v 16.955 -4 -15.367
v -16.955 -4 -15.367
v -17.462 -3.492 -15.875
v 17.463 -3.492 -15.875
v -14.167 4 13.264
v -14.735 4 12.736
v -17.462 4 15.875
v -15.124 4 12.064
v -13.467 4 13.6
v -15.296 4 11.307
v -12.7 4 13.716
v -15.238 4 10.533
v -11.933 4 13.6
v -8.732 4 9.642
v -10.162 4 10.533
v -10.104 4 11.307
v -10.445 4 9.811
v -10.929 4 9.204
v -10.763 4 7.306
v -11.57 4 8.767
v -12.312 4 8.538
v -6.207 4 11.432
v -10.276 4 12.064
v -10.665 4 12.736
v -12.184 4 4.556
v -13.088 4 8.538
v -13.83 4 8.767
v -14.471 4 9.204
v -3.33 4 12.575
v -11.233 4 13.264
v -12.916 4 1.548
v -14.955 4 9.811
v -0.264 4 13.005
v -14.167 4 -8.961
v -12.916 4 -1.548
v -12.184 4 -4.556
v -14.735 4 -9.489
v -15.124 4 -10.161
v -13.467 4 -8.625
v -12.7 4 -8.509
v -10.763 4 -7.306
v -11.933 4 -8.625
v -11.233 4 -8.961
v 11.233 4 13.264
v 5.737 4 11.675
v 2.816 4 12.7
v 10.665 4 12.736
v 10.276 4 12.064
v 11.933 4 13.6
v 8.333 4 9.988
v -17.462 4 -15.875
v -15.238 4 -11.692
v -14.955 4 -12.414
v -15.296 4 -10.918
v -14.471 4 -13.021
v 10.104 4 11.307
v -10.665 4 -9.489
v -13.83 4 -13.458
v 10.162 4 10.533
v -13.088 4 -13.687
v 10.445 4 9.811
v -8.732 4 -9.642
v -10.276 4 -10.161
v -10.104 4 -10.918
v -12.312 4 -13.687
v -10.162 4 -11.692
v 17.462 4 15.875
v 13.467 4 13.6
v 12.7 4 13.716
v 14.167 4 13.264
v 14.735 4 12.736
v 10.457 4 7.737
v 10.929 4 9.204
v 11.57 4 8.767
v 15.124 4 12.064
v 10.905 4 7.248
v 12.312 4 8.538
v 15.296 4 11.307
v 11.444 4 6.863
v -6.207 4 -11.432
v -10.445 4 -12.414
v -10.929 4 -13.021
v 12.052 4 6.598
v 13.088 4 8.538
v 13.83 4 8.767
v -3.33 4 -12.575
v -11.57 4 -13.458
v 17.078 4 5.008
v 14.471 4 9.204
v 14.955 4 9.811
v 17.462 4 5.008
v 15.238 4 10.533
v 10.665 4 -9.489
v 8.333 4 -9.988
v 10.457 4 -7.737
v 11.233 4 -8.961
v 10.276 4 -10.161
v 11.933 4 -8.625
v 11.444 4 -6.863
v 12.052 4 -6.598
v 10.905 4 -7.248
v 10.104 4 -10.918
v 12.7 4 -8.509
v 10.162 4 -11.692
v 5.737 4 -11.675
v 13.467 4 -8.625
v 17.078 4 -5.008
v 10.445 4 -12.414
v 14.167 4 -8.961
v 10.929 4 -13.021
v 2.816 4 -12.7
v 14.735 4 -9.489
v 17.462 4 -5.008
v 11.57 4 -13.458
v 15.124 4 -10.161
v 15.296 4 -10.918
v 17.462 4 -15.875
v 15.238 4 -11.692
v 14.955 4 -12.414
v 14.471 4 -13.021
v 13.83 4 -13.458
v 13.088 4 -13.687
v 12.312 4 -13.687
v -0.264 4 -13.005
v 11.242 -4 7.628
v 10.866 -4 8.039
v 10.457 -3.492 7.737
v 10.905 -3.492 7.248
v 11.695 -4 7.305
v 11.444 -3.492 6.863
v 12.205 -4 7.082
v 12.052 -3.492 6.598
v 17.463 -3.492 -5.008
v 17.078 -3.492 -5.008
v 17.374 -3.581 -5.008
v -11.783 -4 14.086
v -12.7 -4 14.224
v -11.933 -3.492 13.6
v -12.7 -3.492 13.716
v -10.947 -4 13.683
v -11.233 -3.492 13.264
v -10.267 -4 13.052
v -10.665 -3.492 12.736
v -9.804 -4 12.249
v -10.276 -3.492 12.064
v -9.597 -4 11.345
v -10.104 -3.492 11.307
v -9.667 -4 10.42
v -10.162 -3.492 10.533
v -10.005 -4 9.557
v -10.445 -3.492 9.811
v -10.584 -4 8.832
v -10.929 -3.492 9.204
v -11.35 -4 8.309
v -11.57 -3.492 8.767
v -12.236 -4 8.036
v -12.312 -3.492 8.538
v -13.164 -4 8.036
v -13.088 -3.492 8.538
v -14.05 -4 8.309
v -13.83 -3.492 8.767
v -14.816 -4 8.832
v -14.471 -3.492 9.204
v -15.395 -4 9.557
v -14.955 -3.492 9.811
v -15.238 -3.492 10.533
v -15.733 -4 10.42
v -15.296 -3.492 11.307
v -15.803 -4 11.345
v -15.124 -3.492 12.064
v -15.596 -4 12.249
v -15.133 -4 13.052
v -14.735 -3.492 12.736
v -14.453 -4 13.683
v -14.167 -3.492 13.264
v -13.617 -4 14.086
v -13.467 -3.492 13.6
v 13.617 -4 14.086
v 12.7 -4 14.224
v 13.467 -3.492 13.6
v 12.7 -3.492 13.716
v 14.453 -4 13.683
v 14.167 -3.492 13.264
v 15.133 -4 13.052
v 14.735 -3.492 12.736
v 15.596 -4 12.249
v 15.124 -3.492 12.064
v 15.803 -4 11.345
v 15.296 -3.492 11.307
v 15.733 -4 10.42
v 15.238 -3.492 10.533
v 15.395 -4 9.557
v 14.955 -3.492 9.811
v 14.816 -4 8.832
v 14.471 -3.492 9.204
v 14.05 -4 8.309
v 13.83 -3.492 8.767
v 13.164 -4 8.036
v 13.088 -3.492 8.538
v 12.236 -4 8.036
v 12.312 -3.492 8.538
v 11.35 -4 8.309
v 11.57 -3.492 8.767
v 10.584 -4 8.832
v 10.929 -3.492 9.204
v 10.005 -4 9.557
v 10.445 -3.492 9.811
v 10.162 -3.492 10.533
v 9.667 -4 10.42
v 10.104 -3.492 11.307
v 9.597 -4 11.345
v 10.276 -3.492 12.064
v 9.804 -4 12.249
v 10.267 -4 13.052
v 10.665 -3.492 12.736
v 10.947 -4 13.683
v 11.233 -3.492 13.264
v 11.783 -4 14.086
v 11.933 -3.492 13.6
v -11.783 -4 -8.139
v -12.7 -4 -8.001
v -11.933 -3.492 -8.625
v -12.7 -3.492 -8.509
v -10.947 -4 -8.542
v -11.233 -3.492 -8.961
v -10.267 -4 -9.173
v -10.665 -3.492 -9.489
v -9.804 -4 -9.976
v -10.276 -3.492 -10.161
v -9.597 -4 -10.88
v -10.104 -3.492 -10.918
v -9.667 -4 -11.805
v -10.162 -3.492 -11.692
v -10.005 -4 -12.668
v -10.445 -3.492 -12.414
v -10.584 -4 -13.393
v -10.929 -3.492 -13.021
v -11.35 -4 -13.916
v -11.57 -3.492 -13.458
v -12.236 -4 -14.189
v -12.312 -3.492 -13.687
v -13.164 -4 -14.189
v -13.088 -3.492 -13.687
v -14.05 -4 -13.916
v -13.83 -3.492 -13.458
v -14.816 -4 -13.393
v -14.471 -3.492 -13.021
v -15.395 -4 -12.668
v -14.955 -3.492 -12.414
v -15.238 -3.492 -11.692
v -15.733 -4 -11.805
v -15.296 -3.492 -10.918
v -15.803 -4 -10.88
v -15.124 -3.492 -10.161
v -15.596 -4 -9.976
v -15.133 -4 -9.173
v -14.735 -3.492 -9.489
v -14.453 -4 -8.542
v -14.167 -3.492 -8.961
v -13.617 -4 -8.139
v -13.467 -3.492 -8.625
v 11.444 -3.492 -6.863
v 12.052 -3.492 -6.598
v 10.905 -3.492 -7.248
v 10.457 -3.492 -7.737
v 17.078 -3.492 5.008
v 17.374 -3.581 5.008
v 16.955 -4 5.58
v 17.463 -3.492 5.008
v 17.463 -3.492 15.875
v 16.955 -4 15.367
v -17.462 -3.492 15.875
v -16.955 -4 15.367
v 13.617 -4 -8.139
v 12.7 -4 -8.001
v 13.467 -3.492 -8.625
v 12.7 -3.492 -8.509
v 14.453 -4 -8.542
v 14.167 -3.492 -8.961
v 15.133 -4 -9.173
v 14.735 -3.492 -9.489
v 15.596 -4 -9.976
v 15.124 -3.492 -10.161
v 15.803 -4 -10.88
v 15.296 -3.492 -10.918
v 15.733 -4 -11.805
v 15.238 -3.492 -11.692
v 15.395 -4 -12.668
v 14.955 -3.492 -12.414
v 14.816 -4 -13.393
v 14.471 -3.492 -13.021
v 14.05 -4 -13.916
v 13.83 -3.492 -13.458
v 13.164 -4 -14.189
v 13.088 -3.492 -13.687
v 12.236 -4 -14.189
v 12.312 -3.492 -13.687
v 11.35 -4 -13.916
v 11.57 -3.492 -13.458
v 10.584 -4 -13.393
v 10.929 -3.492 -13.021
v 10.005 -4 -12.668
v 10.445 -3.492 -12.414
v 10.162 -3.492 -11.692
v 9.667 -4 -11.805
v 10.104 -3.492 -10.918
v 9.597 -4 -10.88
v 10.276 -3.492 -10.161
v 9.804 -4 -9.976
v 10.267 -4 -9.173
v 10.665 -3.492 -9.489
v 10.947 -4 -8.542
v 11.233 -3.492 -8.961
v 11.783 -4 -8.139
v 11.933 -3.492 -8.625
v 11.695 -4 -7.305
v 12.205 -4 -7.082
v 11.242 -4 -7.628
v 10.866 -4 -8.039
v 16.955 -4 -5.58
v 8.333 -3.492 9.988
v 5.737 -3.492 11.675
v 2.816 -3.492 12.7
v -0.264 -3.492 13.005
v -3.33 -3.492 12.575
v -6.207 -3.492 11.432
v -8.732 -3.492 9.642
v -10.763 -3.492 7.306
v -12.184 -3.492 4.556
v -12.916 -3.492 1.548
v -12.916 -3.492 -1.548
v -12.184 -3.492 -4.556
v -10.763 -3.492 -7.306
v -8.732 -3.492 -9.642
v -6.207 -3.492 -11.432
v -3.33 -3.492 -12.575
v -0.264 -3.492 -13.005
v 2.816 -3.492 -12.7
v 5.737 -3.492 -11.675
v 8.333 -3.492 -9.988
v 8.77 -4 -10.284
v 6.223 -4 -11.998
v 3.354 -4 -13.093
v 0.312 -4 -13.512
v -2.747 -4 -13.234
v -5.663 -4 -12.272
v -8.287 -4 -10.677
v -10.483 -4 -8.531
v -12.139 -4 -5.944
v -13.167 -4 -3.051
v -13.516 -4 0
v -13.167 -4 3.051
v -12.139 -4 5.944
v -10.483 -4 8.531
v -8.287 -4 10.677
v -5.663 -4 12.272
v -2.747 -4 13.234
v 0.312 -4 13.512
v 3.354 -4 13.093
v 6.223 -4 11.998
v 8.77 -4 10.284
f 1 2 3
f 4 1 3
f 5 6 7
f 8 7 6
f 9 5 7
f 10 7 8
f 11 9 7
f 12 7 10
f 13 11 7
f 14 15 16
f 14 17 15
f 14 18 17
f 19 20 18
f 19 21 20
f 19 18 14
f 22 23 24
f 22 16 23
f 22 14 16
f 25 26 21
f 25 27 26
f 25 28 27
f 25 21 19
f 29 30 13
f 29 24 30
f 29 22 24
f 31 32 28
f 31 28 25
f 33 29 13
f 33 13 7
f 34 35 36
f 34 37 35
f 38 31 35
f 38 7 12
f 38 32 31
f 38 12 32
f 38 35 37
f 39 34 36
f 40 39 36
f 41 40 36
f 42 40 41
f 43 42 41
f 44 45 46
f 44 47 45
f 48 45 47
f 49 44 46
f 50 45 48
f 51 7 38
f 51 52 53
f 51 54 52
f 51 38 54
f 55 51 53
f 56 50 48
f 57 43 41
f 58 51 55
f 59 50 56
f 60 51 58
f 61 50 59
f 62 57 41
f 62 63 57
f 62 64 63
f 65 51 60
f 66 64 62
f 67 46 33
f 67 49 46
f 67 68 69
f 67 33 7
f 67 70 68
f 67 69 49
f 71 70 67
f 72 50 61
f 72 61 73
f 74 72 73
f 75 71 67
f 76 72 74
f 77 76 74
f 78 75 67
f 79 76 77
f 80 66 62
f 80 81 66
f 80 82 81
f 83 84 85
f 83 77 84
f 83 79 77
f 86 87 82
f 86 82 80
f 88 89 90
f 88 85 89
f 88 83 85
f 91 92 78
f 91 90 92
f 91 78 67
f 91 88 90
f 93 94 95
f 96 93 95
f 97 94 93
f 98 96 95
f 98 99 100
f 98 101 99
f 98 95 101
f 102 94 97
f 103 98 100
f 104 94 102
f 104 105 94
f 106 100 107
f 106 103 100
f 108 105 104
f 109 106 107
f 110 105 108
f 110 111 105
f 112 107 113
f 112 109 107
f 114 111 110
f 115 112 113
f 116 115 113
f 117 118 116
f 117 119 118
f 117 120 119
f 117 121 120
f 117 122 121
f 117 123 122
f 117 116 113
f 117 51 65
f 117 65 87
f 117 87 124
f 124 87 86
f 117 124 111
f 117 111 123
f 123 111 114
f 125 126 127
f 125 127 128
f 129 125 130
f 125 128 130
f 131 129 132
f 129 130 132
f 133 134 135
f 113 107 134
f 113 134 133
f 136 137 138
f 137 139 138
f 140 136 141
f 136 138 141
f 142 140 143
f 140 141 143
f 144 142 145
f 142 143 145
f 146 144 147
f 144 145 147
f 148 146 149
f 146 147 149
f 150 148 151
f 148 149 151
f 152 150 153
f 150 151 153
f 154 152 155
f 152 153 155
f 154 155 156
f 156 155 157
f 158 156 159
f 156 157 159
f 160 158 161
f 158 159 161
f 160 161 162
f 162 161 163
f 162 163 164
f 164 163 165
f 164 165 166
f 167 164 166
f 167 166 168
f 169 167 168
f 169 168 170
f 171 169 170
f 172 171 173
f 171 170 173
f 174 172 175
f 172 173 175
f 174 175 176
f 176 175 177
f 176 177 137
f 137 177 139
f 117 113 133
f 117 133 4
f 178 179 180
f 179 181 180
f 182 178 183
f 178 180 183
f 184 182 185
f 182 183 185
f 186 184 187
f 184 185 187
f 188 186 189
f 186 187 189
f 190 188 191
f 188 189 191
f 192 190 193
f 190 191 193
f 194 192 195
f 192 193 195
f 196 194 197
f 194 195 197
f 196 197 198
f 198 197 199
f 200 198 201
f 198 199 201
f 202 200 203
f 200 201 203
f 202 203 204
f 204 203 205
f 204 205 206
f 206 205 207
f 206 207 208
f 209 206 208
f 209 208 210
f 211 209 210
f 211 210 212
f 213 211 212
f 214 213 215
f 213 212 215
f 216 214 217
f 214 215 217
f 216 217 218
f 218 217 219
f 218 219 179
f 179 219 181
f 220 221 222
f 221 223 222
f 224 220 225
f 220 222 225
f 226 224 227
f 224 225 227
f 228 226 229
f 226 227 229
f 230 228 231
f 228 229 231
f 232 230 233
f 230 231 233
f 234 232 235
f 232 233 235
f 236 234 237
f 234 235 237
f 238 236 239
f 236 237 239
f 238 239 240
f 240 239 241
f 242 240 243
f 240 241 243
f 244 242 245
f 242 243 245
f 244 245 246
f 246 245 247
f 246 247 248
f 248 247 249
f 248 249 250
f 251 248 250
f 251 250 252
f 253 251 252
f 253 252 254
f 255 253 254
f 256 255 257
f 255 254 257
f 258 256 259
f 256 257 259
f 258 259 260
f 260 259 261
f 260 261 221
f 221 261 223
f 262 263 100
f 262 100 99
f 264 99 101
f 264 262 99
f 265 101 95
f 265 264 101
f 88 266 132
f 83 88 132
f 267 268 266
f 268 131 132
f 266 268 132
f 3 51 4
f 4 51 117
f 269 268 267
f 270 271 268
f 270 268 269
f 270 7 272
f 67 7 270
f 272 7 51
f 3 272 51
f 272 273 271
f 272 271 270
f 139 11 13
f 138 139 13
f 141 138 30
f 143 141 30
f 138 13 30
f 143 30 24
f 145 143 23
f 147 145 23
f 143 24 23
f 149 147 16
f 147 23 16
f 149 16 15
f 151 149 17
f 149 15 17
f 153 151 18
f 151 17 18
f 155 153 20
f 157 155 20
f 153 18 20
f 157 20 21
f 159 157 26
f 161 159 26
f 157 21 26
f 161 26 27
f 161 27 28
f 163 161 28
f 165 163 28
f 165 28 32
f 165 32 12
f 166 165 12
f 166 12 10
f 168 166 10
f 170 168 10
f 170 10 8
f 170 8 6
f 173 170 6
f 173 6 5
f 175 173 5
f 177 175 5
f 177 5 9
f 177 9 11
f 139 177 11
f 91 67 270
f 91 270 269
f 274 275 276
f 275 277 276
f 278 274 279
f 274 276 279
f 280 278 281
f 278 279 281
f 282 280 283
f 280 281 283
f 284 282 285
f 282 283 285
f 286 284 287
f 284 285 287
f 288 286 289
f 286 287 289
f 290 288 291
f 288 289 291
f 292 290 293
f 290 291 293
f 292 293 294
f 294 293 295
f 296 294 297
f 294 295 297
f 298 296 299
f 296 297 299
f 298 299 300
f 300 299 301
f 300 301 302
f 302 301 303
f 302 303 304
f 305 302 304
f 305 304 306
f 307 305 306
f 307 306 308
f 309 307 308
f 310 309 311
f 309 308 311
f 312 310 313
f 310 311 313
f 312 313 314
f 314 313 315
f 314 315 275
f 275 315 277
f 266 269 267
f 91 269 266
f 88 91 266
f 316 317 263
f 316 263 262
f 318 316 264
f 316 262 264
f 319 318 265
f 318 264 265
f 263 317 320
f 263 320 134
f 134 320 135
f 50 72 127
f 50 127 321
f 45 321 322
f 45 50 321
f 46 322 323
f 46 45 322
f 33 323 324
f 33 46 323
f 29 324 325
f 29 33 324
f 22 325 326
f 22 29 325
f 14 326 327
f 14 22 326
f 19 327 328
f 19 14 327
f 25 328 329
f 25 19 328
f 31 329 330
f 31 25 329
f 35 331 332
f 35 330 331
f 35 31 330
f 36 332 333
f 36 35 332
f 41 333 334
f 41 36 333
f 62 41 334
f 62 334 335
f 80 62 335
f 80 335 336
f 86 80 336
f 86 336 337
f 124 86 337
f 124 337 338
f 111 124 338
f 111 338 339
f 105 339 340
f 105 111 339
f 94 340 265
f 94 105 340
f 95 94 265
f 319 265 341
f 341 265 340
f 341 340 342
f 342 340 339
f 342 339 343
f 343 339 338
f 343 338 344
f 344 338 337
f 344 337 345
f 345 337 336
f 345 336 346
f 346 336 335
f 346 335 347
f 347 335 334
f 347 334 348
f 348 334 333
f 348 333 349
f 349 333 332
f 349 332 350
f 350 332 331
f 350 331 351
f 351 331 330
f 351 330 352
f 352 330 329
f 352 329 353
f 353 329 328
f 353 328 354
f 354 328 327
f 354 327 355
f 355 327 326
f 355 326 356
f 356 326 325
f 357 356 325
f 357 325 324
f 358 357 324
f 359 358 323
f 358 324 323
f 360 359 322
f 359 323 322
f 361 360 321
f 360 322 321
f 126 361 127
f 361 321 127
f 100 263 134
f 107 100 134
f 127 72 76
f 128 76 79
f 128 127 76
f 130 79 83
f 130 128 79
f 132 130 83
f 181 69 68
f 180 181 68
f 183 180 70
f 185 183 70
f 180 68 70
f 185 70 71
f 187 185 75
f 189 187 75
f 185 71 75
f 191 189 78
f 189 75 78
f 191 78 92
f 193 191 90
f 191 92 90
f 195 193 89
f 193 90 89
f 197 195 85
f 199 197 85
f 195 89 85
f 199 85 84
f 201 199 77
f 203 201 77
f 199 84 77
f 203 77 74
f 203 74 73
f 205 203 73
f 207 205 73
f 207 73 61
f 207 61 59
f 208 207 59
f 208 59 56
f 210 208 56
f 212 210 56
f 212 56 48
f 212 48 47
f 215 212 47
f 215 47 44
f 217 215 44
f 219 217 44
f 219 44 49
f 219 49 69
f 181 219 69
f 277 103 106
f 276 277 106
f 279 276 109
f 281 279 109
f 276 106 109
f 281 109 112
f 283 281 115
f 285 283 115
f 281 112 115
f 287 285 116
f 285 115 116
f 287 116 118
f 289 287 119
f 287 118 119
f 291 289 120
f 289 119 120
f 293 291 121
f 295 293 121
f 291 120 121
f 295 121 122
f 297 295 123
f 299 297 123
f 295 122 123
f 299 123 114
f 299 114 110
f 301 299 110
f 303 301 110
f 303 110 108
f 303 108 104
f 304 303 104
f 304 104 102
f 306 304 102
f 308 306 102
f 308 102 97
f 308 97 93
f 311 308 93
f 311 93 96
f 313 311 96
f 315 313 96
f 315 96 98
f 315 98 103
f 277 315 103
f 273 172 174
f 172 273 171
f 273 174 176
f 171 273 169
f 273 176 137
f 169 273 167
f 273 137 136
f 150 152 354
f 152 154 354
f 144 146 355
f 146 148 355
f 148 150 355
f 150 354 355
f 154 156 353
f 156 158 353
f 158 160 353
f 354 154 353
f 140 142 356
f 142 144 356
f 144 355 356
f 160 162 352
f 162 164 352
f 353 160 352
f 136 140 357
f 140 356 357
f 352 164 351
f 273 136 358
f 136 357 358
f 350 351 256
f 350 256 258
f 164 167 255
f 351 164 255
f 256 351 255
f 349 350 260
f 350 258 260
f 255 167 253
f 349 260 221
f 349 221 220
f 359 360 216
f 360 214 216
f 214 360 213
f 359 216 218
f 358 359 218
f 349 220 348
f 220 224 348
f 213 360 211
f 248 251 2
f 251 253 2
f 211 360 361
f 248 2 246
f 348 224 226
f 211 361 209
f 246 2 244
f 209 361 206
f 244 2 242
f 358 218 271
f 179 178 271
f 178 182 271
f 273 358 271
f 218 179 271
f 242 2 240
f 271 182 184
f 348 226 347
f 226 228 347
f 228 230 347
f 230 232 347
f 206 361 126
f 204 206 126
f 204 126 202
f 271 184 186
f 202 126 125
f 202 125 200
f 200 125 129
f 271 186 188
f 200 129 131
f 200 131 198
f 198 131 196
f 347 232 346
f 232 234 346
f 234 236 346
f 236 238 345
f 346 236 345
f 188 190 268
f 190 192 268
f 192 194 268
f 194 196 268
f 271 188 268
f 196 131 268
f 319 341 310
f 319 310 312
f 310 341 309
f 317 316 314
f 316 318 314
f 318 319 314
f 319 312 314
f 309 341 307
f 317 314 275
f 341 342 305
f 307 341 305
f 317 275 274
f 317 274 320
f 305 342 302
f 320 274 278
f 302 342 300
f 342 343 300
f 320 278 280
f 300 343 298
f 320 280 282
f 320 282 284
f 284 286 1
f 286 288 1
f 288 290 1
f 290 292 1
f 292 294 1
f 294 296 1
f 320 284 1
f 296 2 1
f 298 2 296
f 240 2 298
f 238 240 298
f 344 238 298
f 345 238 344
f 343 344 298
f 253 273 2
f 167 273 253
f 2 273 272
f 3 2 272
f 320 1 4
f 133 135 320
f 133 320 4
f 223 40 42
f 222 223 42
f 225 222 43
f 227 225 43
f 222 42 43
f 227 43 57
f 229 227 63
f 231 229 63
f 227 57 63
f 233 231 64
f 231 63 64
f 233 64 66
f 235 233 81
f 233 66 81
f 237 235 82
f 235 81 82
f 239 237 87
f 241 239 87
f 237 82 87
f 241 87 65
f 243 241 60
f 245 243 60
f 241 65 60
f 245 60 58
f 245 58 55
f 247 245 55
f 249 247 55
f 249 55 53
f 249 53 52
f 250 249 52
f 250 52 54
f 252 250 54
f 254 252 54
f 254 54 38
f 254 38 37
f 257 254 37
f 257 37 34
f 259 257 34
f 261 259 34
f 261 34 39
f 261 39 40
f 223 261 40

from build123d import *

# Parameters (mm, degrees)
SKETCH1_W              = 34.925
SKETCH1_H              = 31.75
PLATE_DEPTH            = 4
F_10_CLEARANCE_HOLE1_D = 5.1054
LOAD_CELL_CUTOUT_REACH = 26.919
FILLET1_R              = 3.175
CUT_EXTRUDE1_REACH     = 26.919
SKETCH5_R              = 2.6035
CHAMFER1_SIZE          = 0.508


with BuildPart() as part:
    # Sketch1 → Plate (new, symmetric)
    with BuildSketch(Plane(origin=(0, 0, 0), x_dir=(1, 0, 0), z_dir=(0, 1, 0))):
        Rectangle(SKETCH1_W, SKETCH1_H)
    extrude(amount=PLATE_DEPTH, both=True)

    # #10 Clearance Hole1 (through all)
    with Locations(Plane(origin=(0, 4, 0), x_dir=(1, 0, 0), z_dir=(0, 1, 0))):
        with Locations((-12.7, 11.1125), (12.7, 11.1125), (12.7, -11.1125), (-12.7, -11.1125)):
            Hole(F_10_CLEARANCE_HOLE1_D / 2)

    # Sketch4 → Load Cell Cutout (cut, up to next)
    with BuildSketch(Plane(origin=(0, 4, 0), x_dir=(1, 0, 0), z_dir=(0, 1, 0)), mode=Mode.PRIVATE) as load_cell_cutout_sk1:
        with BuildLine():
            Line((11.009869163, 6.927542495), (17.078427656, 5.008))
            Line((17.078427656, 5.008), (22.733, 5.008))
            Line((22.733, 5.008), (22.733, -5.008))
            Line((22.733, -5.008), (17.078427656, -5.008))
            Line((17.078427656, -5.008), (11.009869163, -6.927542495))
            ThreePointArc((11.009869163, -6.927542495), (-13.008, 0), (11.009869163, 6.927542495))
        make_face()
    load_cell_cutout_tool1 = extrude(load_cell_cutout_sk1.sketch, amount=-LOAD_CELL_CUTOUT_REACH, mode=Mode.PRIVATE) & part.part
    add(load_cell_cutout_tool1.solids().sort_by_distance((2.977457, 4, 0))[0], mode=Mode.SUBTRACT)

    # Fillet1
    fillet1_edges = [part.edges().sort_by_distance(p)[0] for p in [
        (11.009869163, 0, 6.927542495),
        (11.009869163, 0, -6.927542495),
    ]]
    fillet(fillet1_edges, radius=FILLET1_R)

    # Sketch5 → Cut-Extrude1 (cut, up to next)
    with BuildSketch(Plane(origin=(0, 4, 0), x_dir=(1, 0, 0), z_dir=(0, 1, 0)), mode=Mode.PRIVATE) as cut_extrude1_sk1:
        with Locations(Location((-12.7, 11.1125, 0), (0, 0, 270))):
            Circle(SKETCH5_R)
    cut_extrude1_tool1 = extrude(cut_extrude1_sk1.sketch, amount=-CUT_EXTRUDE1_REACH, mode=Mode.PRIVATE) & part.part
    # Sketch5 → Cut-Extrude1 (cut, up to next)
    with BuildSketch(Plane(origin=(0, 4, 0), x_dir=(1, 0, 0), z_dir=(0, 1, 0)), mode=Mode.PRIVATE) as cut_extrude1_sk2:
        with Locations(Location((12.7, 11.1125, 0), (0, 0, 270))):
            Circle(SKETCH5_R)
    cut_extrude1_tool2 = extrude(cut_extrude1_sk2.sketch, amount=-CUT_EXTRUDE1_REACH, mode=Mode.PRIVATE) & part.part
    # Sketch5 → Cut-Extrude1 (cut, up to next)
    with BuildSketch(Plane(origin=(0, 4, 0), x_dir=(1, 0, 0), z_dir=(0, 1, 0)), mode=Mode.PRIVATE) as cut_extrude1_sk3:
        with Locations(Location((-12.7, -11.1125, 0), (0, 0, 270))):
            Circle(SKETCH5_R)
    cut_extrude1_tool3 = extrude(cut_extrude1_sk3.sketch, amount=-CUT_EXTRUDE1_REACH, mode=Mode.PRIVATE) & part.part
    # Sketch5 → Cut-Extrude1 (cut, up to next)
    with BuildSketch(Plane(origin=(0, 4, 0), x_dir=(1, 0, 0), z_dir=(0, 1, 0)), mode=Mode.PRIVATE) as cut_extrude1_sk4:
        with Locations(Location((12.7, -11.1125, 0), (0, 0, 270))):
            Circle(SKETCH5_R)
    cut_extrude1_tool4 = extrude(cut_extrude1_sk4.sketch, amount=-CUT_EXTRUDE1_REACH, mode=Mode.PRIVATE) & part.part
    add(cut_extrude1_tool1.solids().sort_by_distance((-12.7, 4, -11.1125))[0], mode=Mode.SUBTRACT)
    add(cut_extrude1_tool2.solids().sort_by_distance((12.7, 4, -11.1125))[0], mode=Mode.SUBTRACT)
    add(cut_extrude1_tool3.solids().sort_by_distance((-12.7, 4, 11.1125))[0], mode=Mode.SUBTRACT)
    add(cut_extrude1_tool4.solids().sort_by_distance((12.7, 4, 11.1125))[0], mode=Mode.SUBTRACT)

    # Chamfer1
    # the kernel refuses this chamfer: 0.508 mm, written as the material it takes off along each edge
    with BuildSketch(Plane(origin=(13.009505309, -4, -9.625084967), x_dir=(-0.30158215810749167, 0, 0.9534401931485937), z_dir=(0.9534401931485937, 0, 0.30158215810749167))) as chamfer1_piece_1:
        Polygon((3.175 - CHAMFER1_SIZE, 0), (3.175, -CHAMFER1_SIZE), (3.175, 0), align=None)
    revolve(axis=Axis((13.009505309, -4, -9.625084967), (0, -1, 0)), revolution_arc=35.951449602, mode=Mode.SUBTRACT)
    with BuildSketch(Plane(origin=(18.324016186, -4, -4.614008558), x_dir=(0.30146813499365677, -0.02749587661058555, -0.9530797135354744), z_dir=(-0.9534401931485939, 0, -0.30158215810749184)), Plane(origin=(12.051981957, -4, 6.597912354), x_dir=(0.30146813499365605, -0.02749587661058387, 0.9530797135354745), z_dir=(0.9534401931485941, 0, -0.30158215810749117))) as chamfer1_piece_2:
        Polygon((CHAMFER1_SIZE * 0.999621916911, -CHAMFER1_SIZE * 0.0274958766106), (-CHAMFER1_SIZE * 0.0274958766106, -CHAMFER1_SIZE * 0.999621916911), (0, 0), align=None)
    extrude(amount=6.578319516, mode=Mode.SUBTRACT)
    with BuildSketch(Plane(origin=(17.4625, -4, -3.701585042), x_dir=(-0.9996219169112968, -0.027495876610585605, 0), z_dir=(0, 0, -1)), Plane(origin=(17.4625, -4, 17.181414958), x_dir=(-0.9996219169112968, -0.027495876610585605, 0), z_dir=(0, 0, -1))) as chamfer1_piece_3:
        Polygon((CHAMFER1_SIZE * 0.999621916911, CHAMFER1_SIZE * 0.0274958766106), (-CHAMFER1_SIZE * 0.0274958766106, CHAMFER1_SIZE * 0.999621916911), (0, 0), align=None)
    extrude(amount=13.479829916, mode=Mode.SUBTRACT)
    with BuildSketch(Plane(origin=(18.768914958, -4, -15.875), x_dir=(0, -0.027495876610585605, 0.9996219169112968), z_dir=(-1, 0, 0)), Plane(origin=(-18.768914958, -4, 15.875), x_dir=(0, -0.027495876610585605, -0.9996219169112968), z_dir=(1, 0, 0))) as chamfer1_piece_4:
        Polygon((CHAMFER1_SIZE * 0.999621916911, CHAMFER1_SIZE * 0.0274958766106), (-CHAMFER1_SIZE * 0.0274958766106, CHAMFER1_SIZE * 0.999621916911), (0, 0), align=None)
    extrude(amount=37.537829916, mode=Mode.SUBTRACT)
    with BuildSketch(Plane(origin=(-17.4625, -4, -17.181414958), x_dir=(0.9996219169112968, -0.027495876610585605, 0), z_dir=(0, 0, 1))) as chamfer1_piece_5:
        Polygon((CHAMFER1_SIZE * 0.999621916911, CHAMFER1_SIZE * 0.0274958766106), (-CHAMFER1_SIZE * 0.0274958766106, CHAMFER1_SIZE * 0.999621916911), (0, 0), align=None)
    extrude(amount=34.362829916, mode=Mode.SUBTRACT)
    with BuildSketch(Plane(origin=(13.009505309, -4, 9.625084967), x_dir=(-0.8038994814723275, 0, -0.5947651836553002), z_dir=(-0.5947651836553002, 0, 0.8038994814723275))) as chamfer1_piece_6:
        Polygon((3.175 - CHAMFER1_SIZE, 0), (3.175, -CHAMFER1_SIZE), (3.175, 0), align=None)
    revolve(axis=Axis((13.009505309, -4, 9.625084967), (0, -1, 0)), revolution_arc=35.951449602, mode=Mode.SUBTRACT)
    with BuildSketch(Plane(origin=(0, -4, 0), x_dir=(0.8038994814723273, 0, -0.5947651836553005), z_dir=(0.5947651836553005, 0, 0.8038994814723273))) as chamfer1_piece_7:
        Polygon((13.008 + CHAMFER1_SIZE, 0), (13.008, CHAMFER1_SIZE), (13.008, 0), align=None)
    revolve(axis=Axis((0, -4, 0), (0, 1, 0)), revolution_arc=287.00821123, mode=Mode.SUBTRACT)
    with BuildSketch(Plane(origin=(-12.7, -4, -11.1125), x_dir=(0, 0, 1), z_dir=(-1, 0, 0))) as chamfer1_piece_8:
        Polygon((2.6035 + CHAMFER1_SIZE, 0), (2.6035, CHAMFER1_SIZE), (2.6035, 0), align=None)
    revolve(axis=Axis((-12.7, -4, -11.1125), (0, 1, 0)), mode=Mode.SUBTRACT)
    with BuildSketch(Plane(origin=(12.7, -4, -11.1125), x_dir=(0, 0, 1), z_dir=(-1, 0, 0))) as chamfer1_piece_9:
        Polygon((2.6035 + CHAMFER1_SIZE, 0), (2.6035, CHAMFER1_SIZE), (2.6035, 0), align=None)
    revolve(axis=Axis((12.7, -4, -11.1125), (0, 1, 0)), mode=Mode.SUBTRACT)
    with BuildSketch(Plane(origin=(-12.7, -4, 11.1125), x_dir=(0, 0, 1), z_dir=(-1, 0, 0))) as chamfer1_piece_10:
        Polygon((2.6035 + CHAMFER1_SIZE, 0), (2.6035, CHAMFER1_SIZE), (2.6035, 0), align=None)
    revolve(axis=Axis((-12.7, -4, 11.1125), (0, 1, 0)), mode=Mode.SUBTRACT)
    with BuildSketch(Plane(origin=(12.7, -4, 11.1125), x_dir=(0, 0, 1), z_dir=(-1, 0, 0))) as chamfer1_piece_11:
        Polygon((2.6035 + CHAMFER1_SIZE, 0), (2.6035, CHAMFER1_SIZE), (2.6035, 0), align=None)
    revolve(axis=Axis((12.7, -4, 11.1125), (0, 1, 0)), mode=Mode.SUBTRACT)


solid = part.part
